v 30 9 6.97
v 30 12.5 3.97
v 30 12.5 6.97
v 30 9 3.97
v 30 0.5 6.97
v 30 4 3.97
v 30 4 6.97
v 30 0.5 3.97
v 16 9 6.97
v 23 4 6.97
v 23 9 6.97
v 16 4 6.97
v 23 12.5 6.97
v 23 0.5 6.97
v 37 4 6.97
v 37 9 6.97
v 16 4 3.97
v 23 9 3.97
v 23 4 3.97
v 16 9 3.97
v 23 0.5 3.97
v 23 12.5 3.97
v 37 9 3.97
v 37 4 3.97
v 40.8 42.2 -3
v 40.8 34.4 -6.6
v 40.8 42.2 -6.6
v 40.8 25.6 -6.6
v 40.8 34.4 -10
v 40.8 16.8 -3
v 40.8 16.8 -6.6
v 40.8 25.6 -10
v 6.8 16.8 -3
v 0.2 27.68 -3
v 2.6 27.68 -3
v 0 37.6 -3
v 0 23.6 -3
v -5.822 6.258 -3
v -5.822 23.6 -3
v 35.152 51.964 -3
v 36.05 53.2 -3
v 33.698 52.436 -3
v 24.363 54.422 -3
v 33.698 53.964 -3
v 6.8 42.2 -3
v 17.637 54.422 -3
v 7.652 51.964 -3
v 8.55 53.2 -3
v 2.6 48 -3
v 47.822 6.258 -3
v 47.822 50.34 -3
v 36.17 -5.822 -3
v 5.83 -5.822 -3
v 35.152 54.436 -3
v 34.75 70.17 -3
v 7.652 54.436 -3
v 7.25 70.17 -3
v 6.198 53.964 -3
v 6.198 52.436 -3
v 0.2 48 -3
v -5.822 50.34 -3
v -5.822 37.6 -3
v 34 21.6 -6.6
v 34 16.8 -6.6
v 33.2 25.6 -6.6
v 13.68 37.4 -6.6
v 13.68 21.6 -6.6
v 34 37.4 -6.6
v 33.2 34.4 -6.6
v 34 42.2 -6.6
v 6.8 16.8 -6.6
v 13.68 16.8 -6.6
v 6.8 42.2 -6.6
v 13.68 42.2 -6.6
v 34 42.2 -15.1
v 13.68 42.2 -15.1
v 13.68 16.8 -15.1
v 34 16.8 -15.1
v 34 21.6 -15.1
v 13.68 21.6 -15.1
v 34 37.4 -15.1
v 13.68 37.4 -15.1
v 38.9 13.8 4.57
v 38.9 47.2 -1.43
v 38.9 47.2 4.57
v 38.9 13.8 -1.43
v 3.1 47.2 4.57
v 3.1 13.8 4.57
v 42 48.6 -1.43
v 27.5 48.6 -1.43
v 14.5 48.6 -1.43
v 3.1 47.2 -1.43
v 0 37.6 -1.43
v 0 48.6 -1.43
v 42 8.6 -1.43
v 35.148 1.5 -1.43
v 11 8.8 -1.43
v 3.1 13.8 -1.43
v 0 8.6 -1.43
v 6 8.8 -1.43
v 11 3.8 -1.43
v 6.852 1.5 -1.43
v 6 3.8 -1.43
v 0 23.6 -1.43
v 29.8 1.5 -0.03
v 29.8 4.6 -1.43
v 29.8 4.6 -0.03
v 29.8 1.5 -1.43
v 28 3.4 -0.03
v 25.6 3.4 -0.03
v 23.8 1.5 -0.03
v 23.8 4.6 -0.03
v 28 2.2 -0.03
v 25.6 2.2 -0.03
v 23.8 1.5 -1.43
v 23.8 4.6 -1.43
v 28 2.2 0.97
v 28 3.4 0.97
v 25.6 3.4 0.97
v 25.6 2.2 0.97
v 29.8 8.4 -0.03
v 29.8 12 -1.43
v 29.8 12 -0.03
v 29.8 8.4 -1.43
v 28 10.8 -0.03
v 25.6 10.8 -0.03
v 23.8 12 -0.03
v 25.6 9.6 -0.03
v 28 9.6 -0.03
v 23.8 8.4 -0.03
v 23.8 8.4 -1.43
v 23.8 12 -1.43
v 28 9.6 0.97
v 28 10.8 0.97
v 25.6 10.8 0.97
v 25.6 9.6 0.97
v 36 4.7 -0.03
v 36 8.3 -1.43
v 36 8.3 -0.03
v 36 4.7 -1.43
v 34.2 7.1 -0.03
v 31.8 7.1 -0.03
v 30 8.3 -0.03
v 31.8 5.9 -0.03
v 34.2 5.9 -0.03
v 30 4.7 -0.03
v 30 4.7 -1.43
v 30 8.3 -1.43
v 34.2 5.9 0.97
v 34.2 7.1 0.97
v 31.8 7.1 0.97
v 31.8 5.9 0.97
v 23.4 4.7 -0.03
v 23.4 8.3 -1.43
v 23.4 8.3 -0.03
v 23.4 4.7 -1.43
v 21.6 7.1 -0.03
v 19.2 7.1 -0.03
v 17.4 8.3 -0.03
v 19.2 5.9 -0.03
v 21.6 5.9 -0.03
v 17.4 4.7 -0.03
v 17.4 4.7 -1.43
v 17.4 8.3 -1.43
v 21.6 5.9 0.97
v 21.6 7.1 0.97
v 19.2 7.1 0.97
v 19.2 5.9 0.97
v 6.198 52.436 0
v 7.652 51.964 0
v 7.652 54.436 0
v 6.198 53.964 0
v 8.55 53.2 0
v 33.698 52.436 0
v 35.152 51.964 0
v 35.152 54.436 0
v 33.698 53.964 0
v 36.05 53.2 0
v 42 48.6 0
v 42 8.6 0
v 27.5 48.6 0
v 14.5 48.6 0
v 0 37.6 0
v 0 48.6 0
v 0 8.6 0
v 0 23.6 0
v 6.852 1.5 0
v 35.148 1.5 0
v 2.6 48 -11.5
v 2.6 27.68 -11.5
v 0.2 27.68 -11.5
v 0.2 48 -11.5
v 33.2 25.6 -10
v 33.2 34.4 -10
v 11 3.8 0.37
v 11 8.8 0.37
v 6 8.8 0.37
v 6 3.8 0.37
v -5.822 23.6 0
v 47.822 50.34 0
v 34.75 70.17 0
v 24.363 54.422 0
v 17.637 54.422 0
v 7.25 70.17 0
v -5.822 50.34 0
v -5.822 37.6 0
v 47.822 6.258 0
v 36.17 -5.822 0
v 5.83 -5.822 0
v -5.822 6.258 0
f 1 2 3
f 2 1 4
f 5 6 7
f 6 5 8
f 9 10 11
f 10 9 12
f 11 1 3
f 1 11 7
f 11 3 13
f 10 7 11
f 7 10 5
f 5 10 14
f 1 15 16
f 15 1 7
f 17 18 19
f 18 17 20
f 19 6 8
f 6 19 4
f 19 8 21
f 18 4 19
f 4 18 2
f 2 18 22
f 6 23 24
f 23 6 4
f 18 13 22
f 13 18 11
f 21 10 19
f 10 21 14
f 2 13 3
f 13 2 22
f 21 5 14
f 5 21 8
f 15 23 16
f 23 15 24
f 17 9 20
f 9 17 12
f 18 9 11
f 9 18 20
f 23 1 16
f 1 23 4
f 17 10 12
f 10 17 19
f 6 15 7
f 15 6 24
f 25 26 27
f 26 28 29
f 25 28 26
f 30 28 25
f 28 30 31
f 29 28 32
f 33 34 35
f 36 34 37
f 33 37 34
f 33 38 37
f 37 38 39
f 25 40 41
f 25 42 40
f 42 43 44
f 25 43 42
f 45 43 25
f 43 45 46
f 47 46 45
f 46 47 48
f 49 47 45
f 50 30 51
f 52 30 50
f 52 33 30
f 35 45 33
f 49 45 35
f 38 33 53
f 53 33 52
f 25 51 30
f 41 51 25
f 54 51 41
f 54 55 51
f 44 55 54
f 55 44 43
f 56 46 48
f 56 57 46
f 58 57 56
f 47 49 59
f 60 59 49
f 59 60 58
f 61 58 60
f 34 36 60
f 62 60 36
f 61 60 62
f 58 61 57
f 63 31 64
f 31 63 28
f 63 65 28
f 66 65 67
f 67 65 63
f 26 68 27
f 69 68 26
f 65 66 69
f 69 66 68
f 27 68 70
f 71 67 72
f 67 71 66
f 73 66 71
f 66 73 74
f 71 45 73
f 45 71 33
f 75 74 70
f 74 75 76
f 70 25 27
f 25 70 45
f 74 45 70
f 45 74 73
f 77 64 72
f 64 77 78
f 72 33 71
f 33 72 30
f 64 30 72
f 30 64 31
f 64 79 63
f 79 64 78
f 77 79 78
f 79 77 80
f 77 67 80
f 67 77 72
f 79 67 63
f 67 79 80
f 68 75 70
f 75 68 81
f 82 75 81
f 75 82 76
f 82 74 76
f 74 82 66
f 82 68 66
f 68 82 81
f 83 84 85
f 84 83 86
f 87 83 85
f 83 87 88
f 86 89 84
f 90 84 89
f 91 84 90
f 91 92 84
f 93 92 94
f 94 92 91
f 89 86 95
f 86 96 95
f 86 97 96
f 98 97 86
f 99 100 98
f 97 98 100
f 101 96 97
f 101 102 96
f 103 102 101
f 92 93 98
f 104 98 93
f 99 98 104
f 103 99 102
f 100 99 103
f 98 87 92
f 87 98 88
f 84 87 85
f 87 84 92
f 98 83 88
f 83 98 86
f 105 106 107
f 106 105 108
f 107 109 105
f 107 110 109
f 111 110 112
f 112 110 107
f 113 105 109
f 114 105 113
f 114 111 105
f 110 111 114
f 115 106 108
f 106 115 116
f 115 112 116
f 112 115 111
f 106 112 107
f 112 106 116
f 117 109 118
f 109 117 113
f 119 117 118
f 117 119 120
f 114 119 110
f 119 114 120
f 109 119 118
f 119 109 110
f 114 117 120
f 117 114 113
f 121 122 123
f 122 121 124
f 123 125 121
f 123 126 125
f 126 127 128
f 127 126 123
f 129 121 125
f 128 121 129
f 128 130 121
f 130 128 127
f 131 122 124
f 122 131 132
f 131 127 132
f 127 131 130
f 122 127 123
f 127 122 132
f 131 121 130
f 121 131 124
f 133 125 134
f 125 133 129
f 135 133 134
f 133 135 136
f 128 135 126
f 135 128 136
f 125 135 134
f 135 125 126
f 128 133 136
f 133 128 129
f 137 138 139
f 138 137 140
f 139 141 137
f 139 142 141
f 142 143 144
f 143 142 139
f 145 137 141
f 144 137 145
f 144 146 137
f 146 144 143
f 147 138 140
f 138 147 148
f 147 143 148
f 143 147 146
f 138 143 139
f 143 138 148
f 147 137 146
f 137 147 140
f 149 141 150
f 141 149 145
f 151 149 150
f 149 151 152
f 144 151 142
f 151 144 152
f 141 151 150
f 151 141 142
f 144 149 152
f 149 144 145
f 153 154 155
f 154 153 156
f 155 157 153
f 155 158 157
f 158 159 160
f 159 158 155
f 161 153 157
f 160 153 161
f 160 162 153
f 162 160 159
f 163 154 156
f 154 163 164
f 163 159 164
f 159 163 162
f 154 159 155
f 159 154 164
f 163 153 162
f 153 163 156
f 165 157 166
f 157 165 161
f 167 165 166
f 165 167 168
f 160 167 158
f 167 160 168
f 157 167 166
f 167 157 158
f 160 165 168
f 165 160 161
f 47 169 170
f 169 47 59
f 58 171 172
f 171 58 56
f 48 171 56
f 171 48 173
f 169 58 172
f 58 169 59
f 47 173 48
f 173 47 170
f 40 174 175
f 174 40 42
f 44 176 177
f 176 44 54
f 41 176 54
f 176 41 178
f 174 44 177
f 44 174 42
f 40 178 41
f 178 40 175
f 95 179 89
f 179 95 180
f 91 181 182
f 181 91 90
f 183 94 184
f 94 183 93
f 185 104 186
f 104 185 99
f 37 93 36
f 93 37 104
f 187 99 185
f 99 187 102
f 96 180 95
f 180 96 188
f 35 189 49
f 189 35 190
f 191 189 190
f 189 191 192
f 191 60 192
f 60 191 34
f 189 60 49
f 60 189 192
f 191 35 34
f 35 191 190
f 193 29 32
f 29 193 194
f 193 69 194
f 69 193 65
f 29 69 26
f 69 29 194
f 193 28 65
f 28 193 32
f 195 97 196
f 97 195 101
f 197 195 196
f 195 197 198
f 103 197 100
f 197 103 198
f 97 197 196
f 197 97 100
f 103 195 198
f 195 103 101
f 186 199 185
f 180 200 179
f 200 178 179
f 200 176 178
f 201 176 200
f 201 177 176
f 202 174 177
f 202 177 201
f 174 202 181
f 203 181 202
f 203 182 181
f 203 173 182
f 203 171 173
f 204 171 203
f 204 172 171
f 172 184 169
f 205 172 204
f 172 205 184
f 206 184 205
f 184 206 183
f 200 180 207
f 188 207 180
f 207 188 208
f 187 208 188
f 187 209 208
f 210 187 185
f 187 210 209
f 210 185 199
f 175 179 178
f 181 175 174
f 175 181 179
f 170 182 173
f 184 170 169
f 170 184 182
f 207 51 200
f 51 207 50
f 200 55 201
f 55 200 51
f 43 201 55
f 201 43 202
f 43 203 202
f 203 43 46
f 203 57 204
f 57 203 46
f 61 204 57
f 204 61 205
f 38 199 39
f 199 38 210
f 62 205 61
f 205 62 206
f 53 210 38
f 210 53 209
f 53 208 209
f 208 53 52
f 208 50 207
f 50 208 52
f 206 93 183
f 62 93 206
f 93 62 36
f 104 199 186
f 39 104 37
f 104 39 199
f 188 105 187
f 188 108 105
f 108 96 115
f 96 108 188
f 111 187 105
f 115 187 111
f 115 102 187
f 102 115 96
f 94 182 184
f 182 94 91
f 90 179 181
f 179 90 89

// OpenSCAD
// file: ../../libs/flat-ui-colors.scad
flatui = [
    "#1abc9c",
    "#2ecc71",
    "#3498db",
    "#9b59b6",
    "#34495e",
    "#f1c40f",
    "#e67e22",
    "#e74c3c",
    "#ecf0f1",
    "#95a5a6",
];
// main file
include <../../libs/flat-ui-colors.scad>;

pcbThickness = 1.57;
acrylicThickness = 3;

m3HoleD = 3.4;

earTipLeftX = 7.25;
earTipRightX = 34.75;
earTipsY = 59.6;

pcbCoreX = 42;
pcbCoreY = 48.6;

s2InsetX = 1.2;
s2MiniPCBTop = 3.6;

header8x1X = 2.4;
header8x1Y = 20.32;
header8x1Z = 8.5;

switchX = 6;
switchY = 3.6;
switchZ = 1.4;
btnZ = 1;

module partsEarHoles(h=pcbThickness) {
    earHoleD = 2.6;
    translate([earTipLeftX, earTipsY - 6.4, -h]) cylinder(h*3, d=earHoleD, true);
    translate([earTipRightX, earTipsY - 6.4, -h]) cylinder(h*3, d=earHoleD, true);
}

module partsNeoPixelHeader() {
    translate([0.2, pcbCoreY-header8x1Y-0.6, -header8x1Z]) cube([header8x1X, header8x1Y, header8x1Z]);
}

module partsUSBPort() {
    usbPortX = 7.6;
    usbPorty = 8.8;
    usbPortz = 3.4;
    translate([pcbCoreX-usbPortX-s2InsetX, pcbCoreY -usbPorty - 14.2, -usbPortz-s2MiniPCBTop]) cube([usbPortX, usbPorty, usbPortz]);
}

module partsS2Mini() {
    miniX = 34;
    miniY = 25.4;
    miniZ = 3.6;
    
    miniYInset = 6.4;
    
    translate([pcbCoreX-miniX-s2InsetX, pcbCoreY-miniY-miniYInset, -miniZ]) cube([miniX, miniY, miniZ]);
    
    // Double to account for male pins
    translate([pcbCoreX-header8x1Y-8, pcbCoreY-miniY-miniYInset, -header8x1Z-s2MiniPCBTop]) cube([header8x1Y, header8x1X*2, header8x1Z]);
    
    translate([pcbCoreX-header8x1Y-8, pcbCoreY-miniYInset-(header8x1X*2), -header8x1Z-s2MiniPCBTop]) cube([header8x1Y, header8x1X*2, header8x1Z]);
}

module partDisplay() {
    displayPCBX = 35.8;
    displayPCBY = 33.4;
    displayPCBZ = 6;
    translate([(pcbCoreX - displayPCBX) / 2, pcbCoreY - displayPCBY - 1.4, pcbThickness]) cube([displayPCBX, displayPCBY, displayPCBZ]);
    
    displayInnerX = 34.4;
    displayInnerY = 22.8;
    displayInnerZ = 6.4;
    
    // Currently not used but pulled from 3D Print Model
    // displayVisibleX = 32;
    // displayVisibleY = 20;
    translate([(pcbCoreX - displayInnerX) / 2, pcbCoreY - displayInnerY - 7.2, 0]) cube([displayInnerX, displayInnerY, displayInnerZ]);
}

module partLED(h = 1.8) {
    translate([6, 3.8, pcbThickness]) cube([5, 5, h]);
}

module partDPadSwitch() {
    cube([switchX, switchY, switchZ]);
    
    btnX = 2.4;
    btnY = 1.2;
    translate([(switchX - btnX)/2, (switchY - btnY)/2, switchZ]) cube([btnX, btnY, btnZ]);
}

module partDPad() {
    translate([pcbCoreX-18.2, 1, pcbThickness]) partDPadSwitch();

    translate([pcbCoreX-18.2, 8.4, pcbThickness]) partDPadSwitch();
    
    translate([pcbCoreX-6-switchX, 4.7, pcbThickness]) partDPadSwitch();
    
    translate([pcbCoreX-18.6-switchX, 4.7, pcbThickness]) partDPadSwitch();
}

module nuggetPCB(h=pcbThickness) {
    translate([0, 0, 0]) {
        partsNeoPixelHeader();
        partsUSBPort();
        partsS2Mini();
        partDisplay();
        partLED();
        partDPad();
        
        color([0, 0, 0]) difference() {
            linear_extrude(height = h, center = false, convexity = 10, twist = 0)
            polygon(
                points=[
                    [0, 8.6],
                    [0, pcbCoreY],
                    [earTipLeftX, earTipsY],
                    [14.5, pcbCoreY],
                    [27.5, pcbCoreY],
                    [earTipRightX, earTipsY],
                    [pcbCoreX, pcbCoreY],
                    [pcbCoreX, 8.6],
                    [33.7, 0],
                    [8.3, 0],
                ]
            );
            
            partsEarHoles();
        }
    }
}

module nuggetUSBPort(h=acrylicThickness) {
    translate([-9, 8.6+15, -h/2]) cube([12, 14, h * 2]);
}

module nuggetLayer(h=acrylicThickness) {
    linear_extrude(height = h, center = false, convexity = 10, twist = 0)
    polygon(
        points=[
            [-5.822, 6.258],
            [-5.822, 50.34],
            [7.25, 70.17],
            [17.637, 54.422],
            [24.363, 54.422],
            [34.75, 70.17],
            [47.822, 50.34],
            [47.822, 6.258],
            [36.170, -5.822],
            [5.830, -5.822],
        ]
    );
}

module backHeaders(h=acrylicThickness) {
    translate([7.77, 16.2, - h/2]) cube([23, 4.5, h]);
    
    translate([7.77, 16.2 + 4.5 + 13.28, - h/2]) cube([23, 4.5, h * 2]);
    
    translate([36, 26.6, -h/2]) cube([6, 22, h * 2]);
}

module nuggetLowerLayer(h=acrylicThickness) {
    color(flatui[2]) union() {
        difference() {
            nuggetLayer(h);
            translate([0, 0, -h/2]) nuggetPCB(h=h*2);
            nuggetUSBPort(h=h*2);
        }
        
        // Bottom barrier
        linear_extrude(height = h, center = false, convexity = 10, twist = 0)
        polygon(
            points=[
                [0, 1.5],
                [42, 1.5],
                [33.7, 0],
                [8.3, 0],
            ]
        );
        
        // Ear barrier
        linear_extrude(height = h, center = false, convexity = 10, twist = 0)
        polygon(
            points=[
                [0, 48.6],
                [7.25, 59.6],
                [14.5, 48.6],
                [13, 48.6],
                [7.25, 58.1],
                [1.5, 48.6],
            ]
        );
        
        linear_extrude(height = h, center = false, convexity = 10, twist = 0)
        polygon(
            points=[
                [0+27.5, 48.6],
                [7.25+27.5, 59.6],
                [14.5+27.5, 48.6],
                [13+27.5, 48.6],
                [7.25+27.5, 58.1],
                [1.5+27.5, 48.6],
            ]
        );
    }
}

module nuggetScrewLayer(h=acrylicThickness) {
    nuggetPCB();
    // TODO: Need to cut down into plastic for this.
    color(flatui[1]) difference() {
        union() {
            difference() {
                nuggetLayer(h);
                translate([0, 0, -h]) nuggetPCB(h=h*3);
                nuggetUSBPort(h=h*2);
                partsEarHoles(h=h*3);
            }
            
            // Bottom barrier
            linear_extrude(height = h, center = false, convexity = 10, twist = 0)
            polygon(
                points=[
                    [0, 1.5],
                    [42, 1.5],
                    [33.7, 0],
                    [8.3, 0],
                ]
            );
            
            // Ear barrier
            linear_extrude(height = h, center = false, convexity = 10, twist = 0)
            polygon(
                points=[
                    [0, 48.6],
                    [7.25, 59.6],
                    [14.5, 48.6],
                ]
            );
            
            linear_extrude(height = h, center = false, convexity = 10, twist = 0)
            polygon(
                points=[
                    [0+27.5, 48.6],
                    [7.25+27.5, 59.6],
                    [14.5+27.5, 48.6],
                ]
            );
        }
        partsEarHoles(h=h*3);
        nuggetPCB();
    }
    
}

module nuggetUpperLayer(h=acrylicThickness) {
    color(flatui[3]) difference() {
        nuggetLayer(h);
        translate([0, 0, -h]) nuggetPCB(h=h*3);
    }
}

module nuggetDPadLayer(h=acrylicThickness) {
    // TODO: CHECK WHAT THE DPAD SHOULD LOOK LIKE
    color(flatui[4]) difference() {
        nuggetLayer(h);
        difference() {
            translate([0, 0, -h]) nuggetPCB(h=h*3);
            translate([-1, -1, -h*2]) cube([44, 17.6, h*5]);
        }
        
        translate([0, 0, -acrylicThickness * 5]) partLED(h = acrylicThickness * 10);
        translate([0, 0, -acrylicThickness * 5]) dpadButtons(h = acrylicThickness * 10);
    }
}

module nuggetScreenLayer(h=acrylicThickness, minusPCB = false) {
    // partDisplay();
    
    color(flatui[6]) difference() {
        nuggetLayer();
        translate([-5.822-5,-5.822-4,-h]) cube([53.644 + 10, 4.6 + 18.6, h * 3]);
        if (minusPCB){translate([0, 0, -h]) nuggetPCB(h=h*3);}
    }
}

module nuggetBack(h=acrylicThickness) {
    color(flatui[7]) difference() {
        nuggetLayer(h);
        backHeaders(h);
    }
}

module dpadButtons(h=acrylicThickness) {
    // TODO: Position the DPAD
    translate([16, 0, pcbThickness+switchZ+btnZ]) {
        translate([7, 0.5, 0]) cube([7, 12, h]);
        translate([0, 4, 0]) cube([21, 5, h]);
    }
}

module caseLayers() {
    dpadButtons();
    
    translate([0, 0, -3]) nuggetScrewLayer();
    
    /**translate([0, 0, 9]) nuggetScreenLayer();
    translate([0, 0, 6]) nuggetScreenLayer(minusPCB=true);
    translate([0, 0, 3]) nuggetDPadLayer();
    translate([0, 0, 0]) nuggetUpperLayer();
    translate([0, 0, -acrylicThickness]) nuggetScrewLayer();*/
    
    
    /** translate([0, 0, -6]) nuggetLowerLayer();
    translate([0, 0, -9]) nuggetLowerLayer();
    
    
    translate([0, 0, -12]) nuggetBack();*/
}

/* difference() {
    caseLayers();
    translate([2.2, 2.2, -16]) cylinder(30, d=m3HoleD, true);
    translate([44.8, 28.6, -16]) cylinder(30, d=m3HoleD, true);
    translate([21, 51.4, -16]) cylinder(30, d=m3HoleD, true);
}*/

// TODO: Add some ventilation?
// TODO: Add Lanyard?



caseLayers();
// nuggetPCB();
